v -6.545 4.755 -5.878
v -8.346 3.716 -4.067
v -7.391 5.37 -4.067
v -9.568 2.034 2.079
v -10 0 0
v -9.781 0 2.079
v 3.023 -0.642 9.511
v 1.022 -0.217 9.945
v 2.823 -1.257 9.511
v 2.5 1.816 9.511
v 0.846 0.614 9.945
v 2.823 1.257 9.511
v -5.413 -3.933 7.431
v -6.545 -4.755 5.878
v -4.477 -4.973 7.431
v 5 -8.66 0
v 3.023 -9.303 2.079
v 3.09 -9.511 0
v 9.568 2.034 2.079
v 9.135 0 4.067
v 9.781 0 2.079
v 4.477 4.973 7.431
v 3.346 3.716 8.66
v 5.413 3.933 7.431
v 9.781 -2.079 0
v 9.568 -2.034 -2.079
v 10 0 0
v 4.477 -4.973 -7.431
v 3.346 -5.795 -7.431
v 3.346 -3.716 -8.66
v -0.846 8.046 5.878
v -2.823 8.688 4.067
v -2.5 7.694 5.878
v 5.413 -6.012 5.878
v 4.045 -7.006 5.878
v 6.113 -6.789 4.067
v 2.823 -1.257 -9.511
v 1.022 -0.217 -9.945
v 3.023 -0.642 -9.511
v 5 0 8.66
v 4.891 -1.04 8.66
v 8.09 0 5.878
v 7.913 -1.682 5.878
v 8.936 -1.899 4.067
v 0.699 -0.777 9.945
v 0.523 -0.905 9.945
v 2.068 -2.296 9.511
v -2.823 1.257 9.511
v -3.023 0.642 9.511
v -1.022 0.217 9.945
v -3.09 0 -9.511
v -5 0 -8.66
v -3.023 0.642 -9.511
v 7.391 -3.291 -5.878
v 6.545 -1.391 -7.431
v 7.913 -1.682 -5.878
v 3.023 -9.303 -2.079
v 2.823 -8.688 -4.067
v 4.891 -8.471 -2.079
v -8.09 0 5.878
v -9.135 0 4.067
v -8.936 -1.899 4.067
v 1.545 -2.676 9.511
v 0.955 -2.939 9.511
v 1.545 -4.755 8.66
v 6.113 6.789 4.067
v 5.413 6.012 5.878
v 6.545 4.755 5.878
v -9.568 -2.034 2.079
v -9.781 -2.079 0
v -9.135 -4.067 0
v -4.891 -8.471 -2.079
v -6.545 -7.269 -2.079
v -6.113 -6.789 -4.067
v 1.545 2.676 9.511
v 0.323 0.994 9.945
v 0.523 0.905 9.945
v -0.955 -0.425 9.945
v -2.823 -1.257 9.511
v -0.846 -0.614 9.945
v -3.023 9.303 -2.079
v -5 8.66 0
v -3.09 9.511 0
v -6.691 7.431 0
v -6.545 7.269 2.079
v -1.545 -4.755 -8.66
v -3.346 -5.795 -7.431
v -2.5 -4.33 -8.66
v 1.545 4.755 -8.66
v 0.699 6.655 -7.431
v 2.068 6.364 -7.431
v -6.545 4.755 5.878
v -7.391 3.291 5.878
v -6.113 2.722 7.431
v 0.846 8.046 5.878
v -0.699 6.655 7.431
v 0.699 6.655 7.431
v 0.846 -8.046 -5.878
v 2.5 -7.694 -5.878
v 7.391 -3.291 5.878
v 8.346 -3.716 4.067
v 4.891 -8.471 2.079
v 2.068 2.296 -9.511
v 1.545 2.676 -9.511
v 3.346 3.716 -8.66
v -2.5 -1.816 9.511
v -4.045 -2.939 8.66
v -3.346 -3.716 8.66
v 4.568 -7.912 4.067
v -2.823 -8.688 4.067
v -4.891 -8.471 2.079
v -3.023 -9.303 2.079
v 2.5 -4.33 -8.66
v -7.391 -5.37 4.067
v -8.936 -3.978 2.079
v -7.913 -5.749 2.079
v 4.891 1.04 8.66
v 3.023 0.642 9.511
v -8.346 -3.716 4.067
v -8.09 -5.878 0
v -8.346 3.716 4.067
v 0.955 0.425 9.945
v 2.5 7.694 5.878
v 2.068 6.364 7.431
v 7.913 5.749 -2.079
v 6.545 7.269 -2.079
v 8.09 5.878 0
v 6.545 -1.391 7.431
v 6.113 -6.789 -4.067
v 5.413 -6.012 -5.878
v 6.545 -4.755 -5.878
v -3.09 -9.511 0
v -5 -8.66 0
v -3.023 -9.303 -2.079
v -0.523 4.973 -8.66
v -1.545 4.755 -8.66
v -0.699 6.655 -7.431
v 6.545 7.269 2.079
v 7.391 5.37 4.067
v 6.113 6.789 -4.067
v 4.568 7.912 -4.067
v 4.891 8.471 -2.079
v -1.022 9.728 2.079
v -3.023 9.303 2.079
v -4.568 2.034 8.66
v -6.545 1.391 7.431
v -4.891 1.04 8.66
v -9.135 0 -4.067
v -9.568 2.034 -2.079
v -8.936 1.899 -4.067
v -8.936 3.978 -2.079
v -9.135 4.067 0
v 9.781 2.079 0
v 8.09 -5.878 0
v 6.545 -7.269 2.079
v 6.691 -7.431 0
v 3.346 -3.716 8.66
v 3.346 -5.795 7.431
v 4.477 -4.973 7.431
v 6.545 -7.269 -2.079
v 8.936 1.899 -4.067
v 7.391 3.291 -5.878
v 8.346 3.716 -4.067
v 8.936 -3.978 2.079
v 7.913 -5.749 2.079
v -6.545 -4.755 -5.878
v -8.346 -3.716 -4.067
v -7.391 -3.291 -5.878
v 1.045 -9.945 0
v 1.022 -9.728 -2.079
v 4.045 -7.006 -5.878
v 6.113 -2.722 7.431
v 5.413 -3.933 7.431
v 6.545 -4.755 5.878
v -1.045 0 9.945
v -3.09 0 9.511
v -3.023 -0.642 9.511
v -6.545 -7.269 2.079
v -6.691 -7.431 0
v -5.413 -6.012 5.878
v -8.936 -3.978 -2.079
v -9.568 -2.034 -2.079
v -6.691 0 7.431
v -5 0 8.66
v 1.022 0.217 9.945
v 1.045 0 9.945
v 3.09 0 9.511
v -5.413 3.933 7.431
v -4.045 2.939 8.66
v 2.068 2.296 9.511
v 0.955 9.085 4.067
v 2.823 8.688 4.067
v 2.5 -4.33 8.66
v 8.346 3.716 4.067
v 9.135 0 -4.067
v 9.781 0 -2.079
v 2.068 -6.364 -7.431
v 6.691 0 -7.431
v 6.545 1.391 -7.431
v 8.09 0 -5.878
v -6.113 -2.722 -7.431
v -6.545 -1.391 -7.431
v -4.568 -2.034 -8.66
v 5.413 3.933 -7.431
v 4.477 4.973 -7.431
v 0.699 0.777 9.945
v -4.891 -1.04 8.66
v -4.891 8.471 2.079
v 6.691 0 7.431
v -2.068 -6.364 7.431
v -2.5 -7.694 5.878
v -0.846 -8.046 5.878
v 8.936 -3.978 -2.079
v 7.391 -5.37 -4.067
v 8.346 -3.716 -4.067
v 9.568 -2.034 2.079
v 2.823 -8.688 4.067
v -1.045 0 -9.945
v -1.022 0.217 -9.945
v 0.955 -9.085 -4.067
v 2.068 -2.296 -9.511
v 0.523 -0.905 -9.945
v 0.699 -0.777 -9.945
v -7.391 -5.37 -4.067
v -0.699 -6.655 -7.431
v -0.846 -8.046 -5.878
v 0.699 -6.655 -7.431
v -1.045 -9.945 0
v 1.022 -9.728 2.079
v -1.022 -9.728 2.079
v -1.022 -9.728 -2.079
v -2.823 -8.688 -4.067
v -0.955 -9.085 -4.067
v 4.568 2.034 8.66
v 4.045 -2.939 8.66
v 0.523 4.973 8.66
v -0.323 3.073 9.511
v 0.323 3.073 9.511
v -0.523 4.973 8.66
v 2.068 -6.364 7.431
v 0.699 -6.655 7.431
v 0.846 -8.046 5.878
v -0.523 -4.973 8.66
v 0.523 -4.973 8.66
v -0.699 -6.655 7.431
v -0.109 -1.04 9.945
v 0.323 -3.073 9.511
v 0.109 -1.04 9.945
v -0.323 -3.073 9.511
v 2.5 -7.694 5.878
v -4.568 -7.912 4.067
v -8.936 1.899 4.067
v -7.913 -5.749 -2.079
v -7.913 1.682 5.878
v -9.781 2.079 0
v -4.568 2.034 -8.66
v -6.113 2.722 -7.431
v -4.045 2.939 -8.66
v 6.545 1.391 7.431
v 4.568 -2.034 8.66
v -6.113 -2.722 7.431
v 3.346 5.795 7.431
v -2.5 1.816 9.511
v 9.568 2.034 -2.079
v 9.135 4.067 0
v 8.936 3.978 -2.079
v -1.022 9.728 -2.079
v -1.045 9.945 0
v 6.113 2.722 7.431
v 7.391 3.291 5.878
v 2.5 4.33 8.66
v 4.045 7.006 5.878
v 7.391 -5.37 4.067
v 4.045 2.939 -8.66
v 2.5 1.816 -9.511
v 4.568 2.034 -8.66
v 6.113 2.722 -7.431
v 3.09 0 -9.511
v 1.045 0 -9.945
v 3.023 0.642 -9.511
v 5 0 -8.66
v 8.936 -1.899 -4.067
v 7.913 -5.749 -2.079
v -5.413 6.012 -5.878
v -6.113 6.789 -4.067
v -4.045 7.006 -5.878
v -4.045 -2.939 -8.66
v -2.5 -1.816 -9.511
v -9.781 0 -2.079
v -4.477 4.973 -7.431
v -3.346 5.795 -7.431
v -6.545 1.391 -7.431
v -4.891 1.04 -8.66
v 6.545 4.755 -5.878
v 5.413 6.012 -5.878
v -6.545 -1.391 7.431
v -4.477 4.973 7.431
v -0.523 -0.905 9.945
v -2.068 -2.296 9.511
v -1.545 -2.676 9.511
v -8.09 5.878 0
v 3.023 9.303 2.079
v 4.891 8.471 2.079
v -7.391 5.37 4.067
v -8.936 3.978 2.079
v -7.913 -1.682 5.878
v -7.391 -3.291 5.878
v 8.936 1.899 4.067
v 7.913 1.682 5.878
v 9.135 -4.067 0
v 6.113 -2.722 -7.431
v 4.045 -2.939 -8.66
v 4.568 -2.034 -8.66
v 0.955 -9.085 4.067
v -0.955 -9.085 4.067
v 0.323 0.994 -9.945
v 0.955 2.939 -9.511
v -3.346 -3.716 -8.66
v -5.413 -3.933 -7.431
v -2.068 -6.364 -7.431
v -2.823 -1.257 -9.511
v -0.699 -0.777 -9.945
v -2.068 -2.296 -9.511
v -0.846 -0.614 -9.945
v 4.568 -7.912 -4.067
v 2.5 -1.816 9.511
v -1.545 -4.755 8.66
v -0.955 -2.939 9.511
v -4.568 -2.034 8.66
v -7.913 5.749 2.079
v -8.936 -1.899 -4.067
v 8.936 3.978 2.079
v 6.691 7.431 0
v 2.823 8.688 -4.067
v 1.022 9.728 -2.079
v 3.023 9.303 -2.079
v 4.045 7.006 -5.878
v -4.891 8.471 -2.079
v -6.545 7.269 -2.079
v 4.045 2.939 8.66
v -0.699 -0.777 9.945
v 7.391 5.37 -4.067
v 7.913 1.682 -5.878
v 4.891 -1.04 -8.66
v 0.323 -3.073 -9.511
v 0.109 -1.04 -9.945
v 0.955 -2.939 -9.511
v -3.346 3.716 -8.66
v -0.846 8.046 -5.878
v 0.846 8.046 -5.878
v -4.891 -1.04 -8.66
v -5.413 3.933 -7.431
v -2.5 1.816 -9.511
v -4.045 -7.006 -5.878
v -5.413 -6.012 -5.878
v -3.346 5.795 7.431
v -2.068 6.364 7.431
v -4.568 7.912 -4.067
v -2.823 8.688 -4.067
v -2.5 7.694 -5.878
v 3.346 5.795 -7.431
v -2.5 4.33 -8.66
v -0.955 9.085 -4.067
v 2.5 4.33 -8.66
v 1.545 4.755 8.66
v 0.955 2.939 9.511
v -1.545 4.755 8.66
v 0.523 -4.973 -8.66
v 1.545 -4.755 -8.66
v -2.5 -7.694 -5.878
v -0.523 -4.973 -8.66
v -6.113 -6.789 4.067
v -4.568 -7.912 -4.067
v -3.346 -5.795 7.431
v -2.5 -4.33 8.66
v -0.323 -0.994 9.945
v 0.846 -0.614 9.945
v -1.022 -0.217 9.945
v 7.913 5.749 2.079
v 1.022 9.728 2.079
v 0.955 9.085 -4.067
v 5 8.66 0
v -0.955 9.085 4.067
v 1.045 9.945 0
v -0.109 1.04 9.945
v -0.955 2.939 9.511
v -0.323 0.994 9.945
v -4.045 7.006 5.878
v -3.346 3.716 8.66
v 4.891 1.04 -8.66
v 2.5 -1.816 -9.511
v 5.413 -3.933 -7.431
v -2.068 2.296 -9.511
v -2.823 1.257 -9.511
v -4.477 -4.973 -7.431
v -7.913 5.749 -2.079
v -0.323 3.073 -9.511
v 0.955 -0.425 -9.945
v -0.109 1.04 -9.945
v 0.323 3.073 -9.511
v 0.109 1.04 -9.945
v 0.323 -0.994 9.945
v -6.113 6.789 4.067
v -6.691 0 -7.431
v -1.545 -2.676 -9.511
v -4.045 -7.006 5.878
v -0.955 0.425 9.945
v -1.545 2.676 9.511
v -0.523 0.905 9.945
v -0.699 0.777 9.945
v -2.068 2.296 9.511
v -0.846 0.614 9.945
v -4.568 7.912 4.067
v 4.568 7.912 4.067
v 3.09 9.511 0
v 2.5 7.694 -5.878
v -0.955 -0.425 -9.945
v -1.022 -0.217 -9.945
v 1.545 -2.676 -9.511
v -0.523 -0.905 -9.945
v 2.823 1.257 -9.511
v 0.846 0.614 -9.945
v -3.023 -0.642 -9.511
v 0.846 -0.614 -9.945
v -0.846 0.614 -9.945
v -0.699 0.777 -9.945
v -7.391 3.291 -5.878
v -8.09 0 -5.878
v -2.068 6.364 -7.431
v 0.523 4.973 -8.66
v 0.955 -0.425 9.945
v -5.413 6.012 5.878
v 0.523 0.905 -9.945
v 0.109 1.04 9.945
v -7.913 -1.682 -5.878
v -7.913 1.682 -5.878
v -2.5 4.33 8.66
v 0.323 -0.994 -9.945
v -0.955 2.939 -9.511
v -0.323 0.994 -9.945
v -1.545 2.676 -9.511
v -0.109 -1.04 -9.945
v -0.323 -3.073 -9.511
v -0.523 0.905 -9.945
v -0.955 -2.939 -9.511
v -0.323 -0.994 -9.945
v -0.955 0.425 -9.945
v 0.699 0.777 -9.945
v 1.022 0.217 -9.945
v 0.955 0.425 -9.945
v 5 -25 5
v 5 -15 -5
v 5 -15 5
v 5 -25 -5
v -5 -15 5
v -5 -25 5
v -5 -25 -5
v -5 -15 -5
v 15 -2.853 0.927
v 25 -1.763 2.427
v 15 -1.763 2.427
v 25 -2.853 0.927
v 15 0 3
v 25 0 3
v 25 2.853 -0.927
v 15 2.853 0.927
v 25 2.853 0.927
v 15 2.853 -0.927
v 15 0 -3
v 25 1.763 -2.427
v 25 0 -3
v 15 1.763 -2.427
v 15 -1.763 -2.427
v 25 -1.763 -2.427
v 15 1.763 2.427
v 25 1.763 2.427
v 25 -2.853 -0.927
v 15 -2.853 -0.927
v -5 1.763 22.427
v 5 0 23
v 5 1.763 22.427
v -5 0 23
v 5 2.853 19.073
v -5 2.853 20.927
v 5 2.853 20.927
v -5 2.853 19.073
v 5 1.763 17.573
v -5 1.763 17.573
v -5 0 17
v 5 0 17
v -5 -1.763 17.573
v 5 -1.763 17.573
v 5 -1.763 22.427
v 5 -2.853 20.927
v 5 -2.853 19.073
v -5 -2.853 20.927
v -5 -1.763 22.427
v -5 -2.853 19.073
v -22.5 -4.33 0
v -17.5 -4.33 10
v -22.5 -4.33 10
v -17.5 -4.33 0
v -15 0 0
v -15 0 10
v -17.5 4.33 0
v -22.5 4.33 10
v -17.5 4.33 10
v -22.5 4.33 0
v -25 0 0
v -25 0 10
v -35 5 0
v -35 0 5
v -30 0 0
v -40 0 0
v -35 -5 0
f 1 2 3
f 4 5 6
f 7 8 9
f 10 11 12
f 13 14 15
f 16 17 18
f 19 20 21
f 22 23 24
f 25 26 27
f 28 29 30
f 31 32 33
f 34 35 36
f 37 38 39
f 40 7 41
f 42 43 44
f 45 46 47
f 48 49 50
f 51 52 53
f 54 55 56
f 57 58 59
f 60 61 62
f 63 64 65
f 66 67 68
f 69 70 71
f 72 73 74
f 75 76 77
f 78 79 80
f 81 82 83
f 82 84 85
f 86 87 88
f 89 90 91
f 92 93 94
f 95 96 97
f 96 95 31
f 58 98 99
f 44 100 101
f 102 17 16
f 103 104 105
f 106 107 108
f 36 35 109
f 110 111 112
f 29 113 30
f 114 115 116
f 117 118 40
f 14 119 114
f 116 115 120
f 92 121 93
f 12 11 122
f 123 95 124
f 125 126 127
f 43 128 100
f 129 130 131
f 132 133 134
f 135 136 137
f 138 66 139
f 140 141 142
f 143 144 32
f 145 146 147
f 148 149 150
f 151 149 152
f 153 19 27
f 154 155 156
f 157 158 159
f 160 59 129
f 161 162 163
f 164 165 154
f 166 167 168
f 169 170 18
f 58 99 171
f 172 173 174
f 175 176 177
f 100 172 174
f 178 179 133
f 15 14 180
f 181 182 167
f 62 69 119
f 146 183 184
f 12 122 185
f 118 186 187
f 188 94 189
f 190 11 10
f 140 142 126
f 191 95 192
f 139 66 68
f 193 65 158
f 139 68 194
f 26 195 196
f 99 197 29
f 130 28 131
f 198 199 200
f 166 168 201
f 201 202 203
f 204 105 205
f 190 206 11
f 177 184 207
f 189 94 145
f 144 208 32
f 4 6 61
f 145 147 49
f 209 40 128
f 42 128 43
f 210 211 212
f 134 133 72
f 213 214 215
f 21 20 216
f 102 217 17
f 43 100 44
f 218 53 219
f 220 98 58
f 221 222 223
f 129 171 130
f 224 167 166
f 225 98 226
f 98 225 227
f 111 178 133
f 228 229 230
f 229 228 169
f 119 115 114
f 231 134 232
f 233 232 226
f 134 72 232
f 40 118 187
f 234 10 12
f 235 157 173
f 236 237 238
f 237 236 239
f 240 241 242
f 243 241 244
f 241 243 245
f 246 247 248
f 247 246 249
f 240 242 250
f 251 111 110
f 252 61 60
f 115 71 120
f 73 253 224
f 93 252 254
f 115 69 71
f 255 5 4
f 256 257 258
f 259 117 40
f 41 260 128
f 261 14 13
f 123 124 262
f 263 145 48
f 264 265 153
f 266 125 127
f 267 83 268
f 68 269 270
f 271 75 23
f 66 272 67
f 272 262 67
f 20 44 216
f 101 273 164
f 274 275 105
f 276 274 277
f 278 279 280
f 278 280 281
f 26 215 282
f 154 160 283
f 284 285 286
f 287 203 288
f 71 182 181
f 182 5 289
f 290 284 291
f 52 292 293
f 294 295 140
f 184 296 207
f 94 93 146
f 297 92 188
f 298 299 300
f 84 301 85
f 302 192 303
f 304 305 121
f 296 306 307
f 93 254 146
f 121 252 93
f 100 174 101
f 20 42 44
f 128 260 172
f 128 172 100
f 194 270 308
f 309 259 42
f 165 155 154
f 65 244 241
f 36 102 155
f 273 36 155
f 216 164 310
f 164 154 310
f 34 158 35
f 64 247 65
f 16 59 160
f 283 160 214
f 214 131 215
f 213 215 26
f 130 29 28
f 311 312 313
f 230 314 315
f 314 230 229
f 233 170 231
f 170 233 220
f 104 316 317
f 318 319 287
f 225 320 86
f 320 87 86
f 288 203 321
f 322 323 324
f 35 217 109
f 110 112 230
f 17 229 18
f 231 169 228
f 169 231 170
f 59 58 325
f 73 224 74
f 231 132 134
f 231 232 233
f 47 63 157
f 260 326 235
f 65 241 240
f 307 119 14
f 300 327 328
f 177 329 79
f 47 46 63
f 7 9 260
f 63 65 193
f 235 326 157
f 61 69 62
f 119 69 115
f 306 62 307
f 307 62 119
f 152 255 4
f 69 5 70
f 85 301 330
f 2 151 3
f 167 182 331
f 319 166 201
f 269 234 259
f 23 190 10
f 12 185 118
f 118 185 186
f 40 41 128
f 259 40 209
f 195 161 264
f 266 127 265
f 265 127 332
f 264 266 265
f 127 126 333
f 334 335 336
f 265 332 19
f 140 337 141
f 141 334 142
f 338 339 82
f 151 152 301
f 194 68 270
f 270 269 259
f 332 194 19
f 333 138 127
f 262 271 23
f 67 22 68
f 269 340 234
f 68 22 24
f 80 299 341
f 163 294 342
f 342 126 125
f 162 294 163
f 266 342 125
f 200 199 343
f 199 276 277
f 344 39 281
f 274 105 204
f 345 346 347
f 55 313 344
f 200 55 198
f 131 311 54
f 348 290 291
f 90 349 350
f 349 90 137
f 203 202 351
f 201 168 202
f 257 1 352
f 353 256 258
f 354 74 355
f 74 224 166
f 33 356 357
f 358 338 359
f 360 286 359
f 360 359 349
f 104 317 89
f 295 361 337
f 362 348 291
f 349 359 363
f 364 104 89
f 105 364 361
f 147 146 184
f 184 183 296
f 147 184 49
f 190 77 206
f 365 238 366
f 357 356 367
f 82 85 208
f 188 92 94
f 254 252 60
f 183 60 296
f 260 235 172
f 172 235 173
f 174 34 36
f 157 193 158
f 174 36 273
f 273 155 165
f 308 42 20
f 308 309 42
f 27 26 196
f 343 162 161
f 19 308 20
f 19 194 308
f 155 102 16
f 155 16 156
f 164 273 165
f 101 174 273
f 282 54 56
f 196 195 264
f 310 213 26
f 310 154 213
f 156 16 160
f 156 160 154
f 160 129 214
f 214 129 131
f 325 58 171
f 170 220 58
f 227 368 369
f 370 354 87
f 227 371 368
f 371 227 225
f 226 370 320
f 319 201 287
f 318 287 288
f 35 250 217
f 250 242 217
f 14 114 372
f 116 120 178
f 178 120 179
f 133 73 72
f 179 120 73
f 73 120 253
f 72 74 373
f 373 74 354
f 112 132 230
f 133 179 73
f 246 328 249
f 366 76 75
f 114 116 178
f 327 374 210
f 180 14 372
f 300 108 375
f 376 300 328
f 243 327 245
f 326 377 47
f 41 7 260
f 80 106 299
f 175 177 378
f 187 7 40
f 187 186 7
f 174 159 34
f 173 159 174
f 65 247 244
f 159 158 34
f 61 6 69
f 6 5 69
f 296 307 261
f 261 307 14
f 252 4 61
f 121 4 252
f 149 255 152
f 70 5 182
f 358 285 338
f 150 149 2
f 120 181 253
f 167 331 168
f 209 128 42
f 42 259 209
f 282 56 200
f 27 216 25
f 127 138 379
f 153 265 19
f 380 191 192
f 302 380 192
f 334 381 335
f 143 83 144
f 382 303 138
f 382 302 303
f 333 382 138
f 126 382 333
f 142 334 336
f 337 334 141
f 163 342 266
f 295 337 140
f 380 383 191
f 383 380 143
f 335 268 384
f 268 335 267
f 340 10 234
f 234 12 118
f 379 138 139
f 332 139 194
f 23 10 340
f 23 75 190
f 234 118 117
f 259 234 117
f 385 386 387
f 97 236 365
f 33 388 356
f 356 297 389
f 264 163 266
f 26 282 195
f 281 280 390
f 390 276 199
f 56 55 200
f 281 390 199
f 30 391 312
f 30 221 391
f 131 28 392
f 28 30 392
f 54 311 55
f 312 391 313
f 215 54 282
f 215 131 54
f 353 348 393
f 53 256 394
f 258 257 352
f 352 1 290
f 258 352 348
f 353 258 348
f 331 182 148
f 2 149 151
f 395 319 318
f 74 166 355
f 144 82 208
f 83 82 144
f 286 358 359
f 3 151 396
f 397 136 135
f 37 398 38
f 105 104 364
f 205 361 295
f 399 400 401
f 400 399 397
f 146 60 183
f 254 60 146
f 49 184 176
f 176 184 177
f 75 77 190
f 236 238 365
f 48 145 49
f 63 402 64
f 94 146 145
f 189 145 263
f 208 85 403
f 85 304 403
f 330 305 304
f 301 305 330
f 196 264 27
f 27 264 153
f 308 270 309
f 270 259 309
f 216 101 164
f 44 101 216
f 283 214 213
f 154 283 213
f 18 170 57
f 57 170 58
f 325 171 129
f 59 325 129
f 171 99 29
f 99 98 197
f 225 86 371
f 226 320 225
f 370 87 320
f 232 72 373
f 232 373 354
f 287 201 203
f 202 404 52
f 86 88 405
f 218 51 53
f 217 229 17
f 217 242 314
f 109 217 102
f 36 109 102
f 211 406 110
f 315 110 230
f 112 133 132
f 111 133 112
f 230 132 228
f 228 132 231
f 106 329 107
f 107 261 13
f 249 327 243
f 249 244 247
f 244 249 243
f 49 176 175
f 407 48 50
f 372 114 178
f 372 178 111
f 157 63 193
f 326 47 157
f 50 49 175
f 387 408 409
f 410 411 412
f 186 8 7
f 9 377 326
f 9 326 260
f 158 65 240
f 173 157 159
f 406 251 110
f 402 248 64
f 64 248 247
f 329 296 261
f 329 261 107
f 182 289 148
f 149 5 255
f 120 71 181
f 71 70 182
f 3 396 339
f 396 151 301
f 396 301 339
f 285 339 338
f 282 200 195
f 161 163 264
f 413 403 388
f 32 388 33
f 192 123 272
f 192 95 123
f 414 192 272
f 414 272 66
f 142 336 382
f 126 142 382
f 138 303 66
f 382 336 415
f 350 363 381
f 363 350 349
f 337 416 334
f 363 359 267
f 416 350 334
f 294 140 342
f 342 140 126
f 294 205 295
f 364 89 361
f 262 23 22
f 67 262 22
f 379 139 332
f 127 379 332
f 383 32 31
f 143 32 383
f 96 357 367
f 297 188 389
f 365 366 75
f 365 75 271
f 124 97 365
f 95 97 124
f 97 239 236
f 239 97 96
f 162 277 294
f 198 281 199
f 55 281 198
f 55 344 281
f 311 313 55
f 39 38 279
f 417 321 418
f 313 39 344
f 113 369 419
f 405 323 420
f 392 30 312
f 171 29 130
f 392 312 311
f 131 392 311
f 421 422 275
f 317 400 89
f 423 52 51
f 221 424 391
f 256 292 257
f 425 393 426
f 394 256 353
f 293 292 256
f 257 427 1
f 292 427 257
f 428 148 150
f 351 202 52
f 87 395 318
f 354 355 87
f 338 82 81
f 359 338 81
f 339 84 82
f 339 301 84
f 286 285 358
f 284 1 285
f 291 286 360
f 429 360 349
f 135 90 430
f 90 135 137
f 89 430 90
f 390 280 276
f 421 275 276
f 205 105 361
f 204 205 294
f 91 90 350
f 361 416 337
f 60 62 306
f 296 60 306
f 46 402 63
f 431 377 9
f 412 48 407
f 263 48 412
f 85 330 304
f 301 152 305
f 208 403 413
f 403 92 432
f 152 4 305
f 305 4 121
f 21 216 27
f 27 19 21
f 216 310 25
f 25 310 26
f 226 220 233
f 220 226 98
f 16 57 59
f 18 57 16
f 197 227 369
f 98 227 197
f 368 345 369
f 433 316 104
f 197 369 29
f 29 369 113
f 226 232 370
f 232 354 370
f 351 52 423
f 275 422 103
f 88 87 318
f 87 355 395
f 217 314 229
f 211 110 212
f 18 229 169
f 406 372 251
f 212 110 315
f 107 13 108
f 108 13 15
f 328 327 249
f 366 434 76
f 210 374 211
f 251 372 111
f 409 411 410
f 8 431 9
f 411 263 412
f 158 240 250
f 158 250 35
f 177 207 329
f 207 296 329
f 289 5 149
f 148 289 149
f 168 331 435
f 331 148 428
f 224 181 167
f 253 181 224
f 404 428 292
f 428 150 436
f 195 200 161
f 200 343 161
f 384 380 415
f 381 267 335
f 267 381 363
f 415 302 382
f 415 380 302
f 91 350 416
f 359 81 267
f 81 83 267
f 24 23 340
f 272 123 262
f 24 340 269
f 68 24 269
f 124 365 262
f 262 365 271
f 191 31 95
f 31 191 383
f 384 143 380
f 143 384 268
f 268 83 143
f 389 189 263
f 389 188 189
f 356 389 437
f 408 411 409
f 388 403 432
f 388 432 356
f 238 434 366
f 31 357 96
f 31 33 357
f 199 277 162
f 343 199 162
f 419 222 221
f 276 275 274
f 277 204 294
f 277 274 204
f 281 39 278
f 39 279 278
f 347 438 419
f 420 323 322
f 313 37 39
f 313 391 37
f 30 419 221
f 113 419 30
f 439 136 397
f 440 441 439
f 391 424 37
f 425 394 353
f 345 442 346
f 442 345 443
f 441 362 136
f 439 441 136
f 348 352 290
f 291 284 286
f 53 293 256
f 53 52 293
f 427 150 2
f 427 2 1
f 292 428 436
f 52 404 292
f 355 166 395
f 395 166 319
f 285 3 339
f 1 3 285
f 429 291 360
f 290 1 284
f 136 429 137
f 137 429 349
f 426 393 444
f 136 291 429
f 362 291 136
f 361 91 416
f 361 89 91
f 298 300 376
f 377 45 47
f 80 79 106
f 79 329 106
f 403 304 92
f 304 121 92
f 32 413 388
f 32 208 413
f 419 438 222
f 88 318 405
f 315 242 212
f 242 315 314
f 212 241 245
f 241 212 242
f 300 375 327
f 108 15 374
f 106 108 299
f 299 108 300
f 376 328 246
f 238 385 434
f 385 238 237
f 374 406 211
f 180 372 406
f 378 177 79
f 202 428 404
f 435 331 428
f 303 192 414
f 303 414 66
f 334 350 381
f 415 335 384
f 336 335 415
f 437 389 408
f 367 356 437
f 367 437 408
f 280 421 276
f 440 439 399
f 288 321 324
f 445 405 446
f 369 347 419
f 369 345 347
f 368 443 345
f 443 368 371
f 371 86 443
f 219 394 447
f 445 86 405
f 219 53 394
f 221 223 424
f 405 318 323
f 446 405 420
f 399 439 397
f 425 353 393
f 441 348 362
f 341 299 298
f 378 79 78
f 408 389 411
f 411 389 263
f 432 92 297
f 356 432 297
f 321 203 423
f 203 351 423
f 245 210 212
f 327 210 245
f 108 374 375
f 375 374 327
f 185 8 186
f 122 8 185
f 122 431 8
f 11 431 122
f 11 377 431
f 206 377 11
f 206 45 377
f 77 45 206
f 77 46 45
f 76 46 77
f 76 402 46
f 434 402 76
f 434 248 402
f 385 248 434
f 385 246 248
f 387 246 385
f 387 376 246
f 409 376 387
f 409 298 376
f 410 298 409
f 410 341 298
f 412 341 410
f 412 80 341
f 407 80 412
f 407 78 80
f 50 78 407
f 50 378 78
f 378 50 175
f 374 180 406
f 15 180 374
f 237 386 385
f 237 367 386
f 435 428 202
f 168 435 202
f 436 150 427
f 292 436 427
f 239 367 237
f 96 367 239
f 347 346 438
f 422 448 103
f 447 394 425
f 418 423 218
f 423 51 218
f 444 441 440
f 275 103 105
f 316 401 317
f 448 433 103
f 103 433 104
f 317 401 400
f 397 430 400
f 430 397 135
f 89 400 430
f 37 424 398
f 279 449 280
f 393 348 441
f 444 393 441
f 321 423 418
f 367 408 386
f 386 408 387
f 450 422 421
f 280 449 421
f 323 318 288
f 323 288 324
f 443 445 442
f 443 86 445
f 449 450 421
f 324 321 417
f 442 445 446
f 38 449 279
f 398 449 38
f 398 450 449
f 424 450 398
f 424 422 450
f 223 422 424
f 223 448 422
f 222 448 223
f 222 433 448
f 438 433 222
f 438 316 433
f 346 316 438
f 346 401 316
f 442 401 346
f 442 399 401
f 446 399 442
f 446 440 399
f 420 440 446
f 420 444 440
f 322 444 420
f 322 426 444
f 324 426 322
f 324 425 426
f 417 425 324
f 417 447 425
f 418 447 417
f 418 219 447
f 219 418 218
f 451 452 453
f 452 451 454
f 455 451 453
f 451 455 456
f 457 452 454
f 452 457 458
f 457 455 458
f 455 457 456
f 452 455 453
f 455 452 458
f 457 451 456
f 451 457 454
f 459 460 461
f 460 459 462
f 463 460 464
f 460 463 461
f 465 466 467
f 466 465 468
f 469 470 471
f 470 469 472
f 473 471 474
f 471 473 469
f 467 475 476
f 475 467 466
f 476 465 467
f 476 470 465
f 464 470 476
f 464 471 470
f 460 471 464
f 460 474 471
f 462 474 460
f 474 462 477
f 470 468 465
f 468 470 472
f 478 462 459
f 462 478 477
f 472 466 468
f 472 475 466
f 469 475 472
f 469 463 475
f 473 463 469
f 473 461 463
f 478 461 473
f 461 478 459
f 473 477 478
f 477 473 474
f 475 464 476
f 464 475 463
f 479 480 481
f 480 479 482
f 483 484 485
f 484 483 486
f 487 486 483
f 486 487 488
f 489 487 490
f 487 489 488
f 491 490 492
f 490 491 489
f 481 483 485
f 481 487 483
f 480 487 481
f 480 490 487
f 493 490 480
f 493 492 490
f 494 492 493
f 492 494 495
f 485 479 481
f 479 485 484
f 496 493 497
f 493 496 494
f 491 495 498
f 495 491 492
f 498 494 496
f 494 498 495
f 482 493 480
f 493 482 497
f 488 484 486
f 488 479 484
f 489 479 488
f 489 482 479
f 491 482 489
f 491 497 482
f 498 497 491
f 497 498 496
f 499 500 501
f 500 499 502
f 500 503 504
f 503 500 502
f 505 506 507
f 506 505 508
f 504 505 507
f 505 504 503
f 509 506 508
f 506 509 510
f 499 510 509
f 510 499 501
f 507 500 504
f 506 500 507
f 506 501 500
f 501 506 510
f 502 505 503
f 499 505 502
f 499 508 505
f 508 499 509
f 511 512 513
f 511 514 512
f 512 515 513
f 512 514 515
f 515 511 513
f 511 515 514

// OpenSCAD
/* Tutorial 1 - Basic 3D drawing */

/* Comments are C-style, lines must end with a semicolon */

/* 3D fundamental shapes are easy */
sphere(r = 10, center = true);

/* Operations are chained */
translate([0, -20, 0]) cube(10, center = true);

/* They are evaluated right-to-left */
color("red") translate([20, 0, 0]) rotate([0, 90, 0])
	cylinder(r = 3, h = 10, center = true);
color([0, 1, 0, 0.5]) rotate([0, -90, 0]) translate([20, 0, 0])
	cylinder(r = 3, h = 10, center = true);

/* The special variable $fn changes how rounded things are */
translate([-20, 0, 0]) cylinder(r = 5, h = 10, $fn = 6);
translate([-35, 0, 0]) cylinder(r1 = 5, r2 = 0, h = 5, $fn = 4);
